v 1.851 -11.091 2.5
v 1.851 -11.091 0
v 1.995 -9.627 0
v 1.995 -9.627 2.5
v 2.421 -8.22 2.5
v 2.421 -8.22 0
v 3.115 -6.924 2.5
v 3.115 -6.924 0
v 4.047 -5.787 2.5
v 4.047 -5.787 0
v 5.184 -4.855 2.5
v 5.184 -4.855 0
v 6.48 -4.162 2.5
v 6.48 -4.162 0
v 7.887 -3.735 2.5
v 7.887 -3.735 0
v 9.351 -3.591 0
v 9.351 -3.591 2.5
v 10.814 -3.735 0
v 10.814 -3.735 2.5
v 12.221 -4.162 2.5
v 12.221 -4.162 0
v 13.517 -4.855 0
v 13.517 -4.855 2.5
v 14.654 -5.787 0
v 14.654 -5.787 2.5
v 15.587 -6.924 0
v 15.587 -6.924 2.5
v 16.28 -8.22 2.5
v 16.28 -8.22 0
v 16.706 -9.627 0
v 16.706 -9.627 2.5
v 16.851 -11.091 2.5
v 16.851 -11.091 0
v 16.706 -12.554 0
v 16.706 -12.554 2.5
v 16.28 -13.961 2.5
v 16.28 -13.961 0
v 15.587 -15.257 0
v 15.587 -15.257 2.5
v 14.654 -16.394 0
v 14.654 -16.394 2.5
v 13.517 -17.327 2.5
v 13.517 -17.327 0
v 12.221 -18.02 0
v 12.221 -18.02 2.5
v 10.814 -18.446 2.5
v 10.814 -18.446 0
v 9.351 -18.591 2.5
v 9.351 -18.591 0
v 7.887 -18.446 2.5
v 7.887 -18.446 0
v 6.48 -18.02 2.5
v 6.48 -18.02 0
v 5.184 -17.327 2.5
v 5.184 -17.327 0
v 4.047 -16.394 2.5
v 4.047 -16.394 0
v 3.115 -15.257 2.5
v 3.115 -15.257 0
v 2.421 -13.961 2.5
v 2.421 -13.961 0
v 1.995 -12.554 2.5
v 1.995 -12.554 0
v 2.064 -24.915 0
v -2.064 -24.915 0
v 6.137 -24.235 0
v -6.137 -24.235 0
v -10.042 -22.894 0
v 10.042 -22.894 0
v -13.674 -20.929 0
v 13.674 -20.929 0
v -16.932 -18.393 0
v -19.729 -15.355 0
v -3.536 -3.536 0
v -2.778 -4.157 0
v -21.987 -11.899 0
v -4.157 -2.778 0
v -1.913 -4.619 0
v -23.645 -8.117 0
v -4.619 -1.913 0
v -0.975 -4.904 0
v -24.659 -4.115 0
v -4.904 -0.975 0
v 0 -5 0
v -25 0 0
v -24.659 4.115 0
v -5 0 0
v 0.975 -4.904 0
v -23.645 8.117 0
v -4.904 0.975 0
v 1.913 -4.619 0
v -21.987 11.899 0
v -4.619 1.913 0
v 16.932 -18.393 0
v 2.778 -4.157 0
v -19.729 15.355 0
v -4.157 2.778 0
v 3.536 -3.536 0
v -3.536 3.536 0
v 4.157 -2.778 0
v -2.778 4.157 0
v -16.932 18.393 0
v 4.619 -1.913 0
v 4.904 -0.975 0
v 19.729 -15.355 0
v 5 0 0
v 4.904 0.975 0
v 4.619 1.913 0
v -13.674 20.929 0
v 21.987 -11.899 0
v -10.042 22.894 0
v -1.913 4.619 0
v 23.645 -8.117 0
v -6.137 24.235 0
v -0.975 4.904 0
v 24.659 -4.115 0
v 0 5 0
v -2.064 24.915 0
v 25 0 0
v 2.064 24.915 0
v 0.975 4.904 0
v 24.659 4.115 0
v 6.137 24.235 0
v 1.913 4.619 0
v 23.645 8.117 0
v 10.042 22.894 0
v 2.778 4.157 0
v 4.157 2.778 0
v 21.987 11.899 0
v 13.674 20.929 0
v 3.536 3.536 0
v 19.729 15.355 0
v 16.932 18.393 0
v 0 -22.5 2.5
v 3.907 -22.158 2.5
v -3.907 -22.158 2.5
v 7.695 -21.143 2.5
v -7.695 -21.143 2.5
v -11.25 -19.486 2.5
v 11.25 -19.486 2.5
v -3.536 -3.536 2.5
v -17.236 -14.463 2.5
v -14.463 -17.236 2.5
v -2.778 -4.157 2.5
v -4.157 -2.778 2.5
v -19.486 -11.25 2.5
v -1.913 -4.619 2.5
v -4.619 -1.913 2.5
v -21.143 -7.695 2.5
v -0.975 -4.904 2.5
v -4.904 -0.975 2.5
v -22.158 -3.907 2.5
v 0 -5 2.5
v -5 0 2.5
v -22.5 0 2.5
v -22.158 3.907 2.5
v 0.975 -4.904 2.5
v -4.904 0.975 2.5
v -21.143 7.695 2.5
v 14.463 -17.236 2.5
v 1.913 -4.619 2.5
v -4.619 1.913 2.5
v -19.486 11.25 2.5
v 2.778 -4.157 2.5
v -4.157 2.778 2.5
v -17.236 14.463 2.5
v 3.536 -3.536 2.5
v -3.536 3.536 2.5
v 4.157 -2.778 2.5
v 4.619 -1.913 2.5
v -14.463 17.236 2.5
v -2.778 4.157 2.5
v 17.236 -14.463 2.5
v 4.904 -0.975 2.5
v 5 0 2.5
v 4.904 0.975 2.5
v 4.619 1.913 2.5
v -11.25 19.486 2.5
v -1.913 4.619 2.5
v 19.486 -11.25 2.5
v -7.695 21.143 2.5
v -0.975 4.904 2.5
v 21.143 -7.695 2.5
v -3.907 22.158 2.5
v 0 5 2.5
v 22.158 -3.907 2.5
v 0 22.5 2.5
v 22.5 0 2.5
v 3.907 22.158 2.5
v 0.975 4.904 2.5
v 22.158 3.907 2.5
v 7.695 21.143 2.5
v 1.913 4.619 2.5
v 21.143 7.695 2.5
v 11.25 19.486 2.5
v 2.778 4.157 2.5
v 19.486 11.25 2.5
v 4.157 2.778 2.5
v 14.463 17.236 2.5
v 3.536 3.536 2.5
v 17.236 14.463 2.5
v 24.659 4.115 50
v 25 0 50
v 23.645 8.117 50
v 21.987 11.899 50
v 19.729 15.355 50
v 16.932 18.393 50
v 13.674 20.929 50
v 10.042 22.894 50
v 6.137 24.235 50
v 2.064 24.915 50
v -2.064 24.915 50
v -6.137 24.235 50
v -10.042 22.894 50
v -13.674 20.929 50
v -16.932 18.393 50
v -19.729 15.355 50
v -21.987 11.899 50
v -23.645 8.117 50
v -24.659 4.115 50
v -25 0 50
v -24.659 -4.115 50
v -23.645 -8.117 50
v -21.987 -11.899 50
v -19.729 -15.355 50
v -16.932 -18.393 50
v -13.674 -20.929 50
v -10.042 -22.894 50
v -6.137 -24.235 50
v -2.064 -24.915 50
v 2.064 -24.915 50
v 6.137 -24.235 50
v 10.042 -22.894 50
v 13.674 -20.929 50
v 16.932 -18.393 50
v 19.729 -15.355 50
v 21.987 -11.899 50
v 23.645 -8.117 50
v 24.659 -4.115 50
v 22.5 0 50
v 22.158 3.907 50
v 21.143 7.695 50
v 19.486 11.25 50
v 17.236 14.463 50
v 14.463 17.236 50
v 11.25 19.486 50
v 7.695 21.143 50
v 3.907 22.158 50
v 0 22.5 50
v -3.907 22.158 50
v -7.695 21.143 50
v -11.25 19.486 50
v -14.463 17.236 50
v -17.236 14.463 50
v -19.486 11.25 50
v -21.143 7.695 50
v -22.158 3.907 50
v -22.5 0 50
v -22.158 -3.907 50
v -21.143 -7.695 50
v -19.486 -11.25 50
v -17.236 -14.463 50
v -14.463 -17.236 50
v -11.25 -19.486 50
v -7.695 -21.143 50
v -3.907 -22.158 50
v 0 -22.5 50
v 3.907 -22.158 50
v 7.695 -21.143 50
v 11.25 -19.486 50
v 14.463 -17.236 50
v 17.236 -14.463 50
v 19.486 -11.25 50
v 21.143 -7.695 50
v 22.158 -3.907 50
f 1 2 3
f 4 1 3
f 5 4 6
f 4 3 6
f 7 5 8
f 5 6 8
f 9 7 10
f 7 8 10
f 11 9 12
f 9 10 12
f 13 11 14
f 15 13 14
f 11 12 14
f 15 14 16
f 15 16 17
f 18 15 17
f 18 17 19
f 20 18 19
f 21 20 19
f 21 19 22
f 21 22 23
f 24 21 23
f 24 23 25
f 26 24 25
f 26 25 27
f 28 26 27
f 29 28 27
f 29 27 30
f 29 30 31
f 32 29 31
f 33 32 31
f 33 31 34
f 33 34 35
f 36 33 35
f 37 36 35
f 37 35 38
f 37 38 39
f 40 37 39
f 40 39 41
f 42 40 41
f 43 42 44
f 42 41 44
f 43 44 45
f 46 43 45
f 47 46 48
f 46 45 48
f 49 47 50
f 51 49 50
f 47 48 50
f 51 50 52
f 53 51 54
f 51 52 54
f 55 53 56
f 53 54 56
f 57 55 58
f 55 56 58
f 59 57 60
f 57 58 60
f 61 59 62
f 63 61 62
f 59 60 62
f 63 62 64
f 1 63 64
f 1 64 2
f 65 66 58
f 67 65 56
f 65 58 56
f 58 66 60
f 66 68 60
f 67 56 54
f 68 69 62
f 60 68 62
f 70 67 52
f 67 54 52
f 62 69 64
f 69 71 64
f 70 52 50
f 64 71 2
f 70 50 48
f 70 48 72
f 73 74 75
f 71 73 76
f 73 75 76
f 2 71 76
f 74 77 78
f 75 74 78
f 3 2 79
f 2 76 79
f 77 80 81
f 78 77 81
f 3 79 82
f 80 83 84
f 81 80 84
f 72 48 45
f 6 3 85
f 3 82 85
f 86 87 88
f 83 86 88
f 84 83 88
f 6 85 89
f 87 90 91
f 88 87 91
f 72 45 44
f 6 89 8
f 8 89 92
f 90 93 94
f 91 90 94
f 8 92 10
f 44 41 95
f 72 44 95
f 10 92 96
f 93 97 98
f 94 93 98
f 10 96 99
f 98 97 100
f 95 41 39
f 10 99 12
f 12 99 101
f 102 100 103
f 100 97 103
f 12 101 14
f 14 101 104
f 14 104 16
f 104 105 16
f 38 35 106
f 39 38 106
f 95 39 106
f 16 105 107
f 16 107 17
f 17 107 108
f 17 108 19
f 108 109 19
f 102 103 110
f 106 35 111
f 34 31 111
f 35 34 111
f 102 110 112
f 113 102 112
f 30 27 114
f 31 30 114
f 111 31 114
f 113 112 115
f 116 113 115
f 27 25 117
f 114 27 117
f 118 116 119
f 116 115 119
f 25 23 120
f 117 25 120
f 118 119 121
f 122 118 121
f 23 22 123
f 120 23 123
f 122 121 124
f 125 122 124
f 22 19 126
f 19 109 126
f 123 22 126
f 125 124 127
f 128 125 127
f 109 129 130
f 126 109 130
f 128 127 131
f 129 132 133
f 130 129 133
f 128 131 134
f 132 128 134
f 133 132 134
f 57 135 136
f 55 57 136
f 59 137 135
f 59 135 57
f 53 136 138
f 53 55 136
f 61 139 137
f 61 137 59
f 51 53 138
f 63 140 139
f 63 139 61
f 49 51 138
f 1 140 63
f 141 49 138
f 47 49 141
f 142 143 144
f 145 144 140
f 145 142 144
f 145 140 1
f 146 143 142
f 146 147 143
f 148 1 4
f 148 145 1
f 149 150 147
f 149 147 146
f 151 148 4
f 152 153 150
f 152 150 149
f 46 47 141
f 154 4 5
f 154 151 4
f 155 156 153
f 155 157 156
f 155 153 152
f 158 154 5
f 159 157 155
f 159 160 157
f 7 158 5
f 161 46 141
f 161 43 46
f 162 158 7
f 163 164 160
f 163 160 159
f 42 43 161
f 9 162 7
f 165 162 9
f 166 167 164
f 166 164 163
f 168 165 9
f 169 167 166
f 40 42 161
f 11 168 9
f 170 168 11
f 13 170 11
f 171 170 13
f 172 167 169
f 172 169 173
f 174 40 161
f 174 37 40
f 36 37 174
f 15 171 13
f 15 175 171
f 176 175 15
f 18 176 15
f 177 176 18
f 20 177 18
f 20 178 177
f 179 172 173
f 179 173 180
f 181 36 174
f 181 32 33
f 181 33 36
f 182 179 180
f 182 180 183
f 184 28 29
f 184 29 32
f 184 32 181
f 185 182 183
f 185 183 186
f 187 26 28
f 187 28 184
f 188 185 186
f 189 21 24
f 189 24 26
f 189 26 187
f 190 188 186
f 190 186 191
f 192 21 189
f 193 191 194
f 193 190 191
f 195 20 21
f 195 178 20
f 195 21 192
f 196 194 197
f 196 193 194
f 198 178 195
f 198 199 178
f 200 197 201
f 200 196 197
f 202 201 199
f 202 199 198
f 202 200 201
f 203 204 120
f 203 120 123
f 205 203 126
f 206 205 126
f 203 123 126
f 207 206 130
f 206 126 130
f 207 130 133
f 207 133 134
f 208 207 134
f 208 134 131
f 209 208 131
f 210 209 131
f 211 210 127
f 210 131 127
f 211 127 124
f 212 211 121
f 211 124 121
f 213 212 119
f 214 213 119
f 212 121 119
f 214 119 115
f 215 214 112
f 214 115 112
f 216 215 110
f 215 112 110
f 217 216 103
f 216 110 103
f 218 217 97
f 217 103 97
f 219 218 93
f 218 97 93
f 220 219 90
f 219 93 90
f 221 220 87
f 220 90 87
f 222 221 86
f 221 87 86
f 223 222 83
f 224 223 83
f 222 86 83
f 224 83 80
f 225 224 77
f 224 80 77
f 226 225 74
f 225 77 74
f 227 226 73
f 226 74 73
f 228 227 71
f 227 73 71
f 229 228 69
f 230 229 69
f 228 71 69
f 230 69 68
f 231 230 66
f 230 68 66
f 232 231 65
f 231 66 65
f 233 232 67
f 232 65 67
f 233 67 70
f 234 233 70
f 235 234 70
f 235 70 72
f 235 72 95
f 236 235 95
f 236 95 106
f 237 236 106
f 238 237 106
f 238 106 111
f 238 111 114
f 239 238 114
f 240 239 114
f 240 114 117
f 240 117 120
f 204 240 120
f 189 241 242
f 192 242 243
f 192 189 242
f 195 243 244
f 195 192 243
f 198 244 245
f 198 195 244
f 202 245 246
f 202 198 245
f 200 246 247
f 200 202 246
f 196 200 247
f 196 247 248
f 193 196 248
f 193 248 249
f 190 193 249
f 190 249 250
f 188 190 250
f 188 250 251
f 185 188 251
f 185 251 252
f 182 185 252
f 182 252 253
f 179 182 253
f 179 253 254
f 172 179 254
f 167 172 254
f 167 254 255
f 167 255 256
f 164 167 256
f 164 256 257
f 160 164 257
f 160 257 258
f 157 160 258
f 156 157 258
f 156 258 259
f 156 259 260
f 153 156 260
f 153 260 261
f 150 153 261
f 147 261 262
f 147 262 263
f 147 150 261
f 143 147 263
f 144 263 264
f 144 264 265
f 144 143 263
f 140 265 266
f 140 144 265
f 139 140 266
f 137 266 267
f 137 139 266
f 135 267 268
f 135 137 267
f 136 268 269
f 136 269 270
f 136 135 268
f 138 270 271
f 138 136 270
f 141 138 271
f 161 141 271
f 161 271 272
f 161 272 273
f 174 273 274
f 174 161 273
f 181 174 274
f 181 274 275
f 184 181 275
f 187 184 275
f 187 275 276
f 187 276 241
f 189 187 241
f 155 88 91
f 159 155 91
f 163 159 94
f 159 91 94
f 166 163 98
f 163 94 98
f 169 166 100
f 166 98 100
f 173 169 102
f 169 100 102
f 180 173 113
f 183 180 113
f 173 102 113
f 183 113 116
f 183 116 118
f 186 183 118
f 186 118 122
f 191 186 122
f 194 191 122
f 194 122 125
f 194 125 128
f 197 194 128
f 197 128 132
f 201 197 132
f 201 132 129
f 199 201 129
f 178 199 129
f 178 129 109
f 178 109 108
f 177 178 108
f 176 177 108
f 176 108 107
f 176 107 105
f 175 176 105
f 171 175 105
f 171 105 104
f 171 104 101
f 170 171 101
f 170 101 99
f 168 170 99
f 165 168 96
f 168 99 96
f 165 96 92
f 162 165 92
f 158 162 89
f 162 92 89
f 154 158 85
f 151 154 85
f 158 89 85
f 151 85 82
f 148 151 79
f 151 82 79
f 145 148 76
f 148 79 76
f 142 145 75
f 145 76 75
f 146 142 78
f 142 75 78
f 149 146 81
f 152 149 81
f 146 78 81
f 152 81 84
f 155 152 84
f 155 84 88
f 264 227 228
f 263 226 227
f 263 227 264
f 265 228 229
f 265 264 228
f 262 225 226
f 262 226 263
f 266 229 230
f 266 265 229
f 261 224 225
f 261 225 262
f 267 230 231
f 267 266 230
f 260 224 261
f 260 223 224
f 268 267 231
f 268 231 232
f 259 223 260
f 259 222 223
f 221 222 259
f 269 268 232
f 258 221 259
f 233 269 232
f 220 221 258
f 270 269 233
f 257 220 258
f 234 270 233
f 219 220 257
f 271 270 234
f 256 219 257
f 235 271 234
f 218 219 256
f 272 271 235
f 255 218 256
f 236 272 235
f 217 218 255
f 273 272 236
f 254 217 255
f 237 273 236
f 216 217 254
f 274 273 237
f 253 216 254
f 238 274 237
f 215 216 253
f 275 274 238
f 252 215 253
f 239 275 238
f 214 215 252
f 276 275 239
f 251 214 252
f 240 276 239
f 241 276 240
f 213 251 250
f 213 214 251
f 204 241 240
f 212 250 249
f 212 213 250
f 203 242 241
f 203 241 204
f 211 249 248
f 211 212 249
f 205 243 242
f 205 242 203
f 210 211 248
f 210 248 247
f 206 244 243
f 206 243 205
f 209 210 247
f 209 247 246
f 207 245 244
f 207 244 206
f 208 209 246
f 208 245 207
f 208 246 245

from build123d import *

# Parameters (mm, degrees)
F0_R     = 25
F1_DEPTH = 50
F2_T     = -2.5
F4_D     = 10
F6_D     = 15


with BuildPart() as f1:
    # F0 (on Top) → F1 (new body)
    with BuildSketch(Plane.XY):
        Circle(F0_R)
    extrude(amount=F1_DEPTH)

    # F2
    f2_openings = [f1.faces().sort_by_distance(p)[0] for p in [
        (0, 0, 50),
    ]]
    offset(amount=F2_T, openings=f2_openings)

    # F4 (through all)
    with Locations(Plane.XY.offset(2.5)):
        with Locations((0, 0)):
            Hole(F4_D / 2)

    # F6 (through all)
    with Locations(Plane.XY.offset(2.5)):
        with Locations((9.350582, -11.090602)):
            Hole(F6_D / 2)


solid = f1.part
